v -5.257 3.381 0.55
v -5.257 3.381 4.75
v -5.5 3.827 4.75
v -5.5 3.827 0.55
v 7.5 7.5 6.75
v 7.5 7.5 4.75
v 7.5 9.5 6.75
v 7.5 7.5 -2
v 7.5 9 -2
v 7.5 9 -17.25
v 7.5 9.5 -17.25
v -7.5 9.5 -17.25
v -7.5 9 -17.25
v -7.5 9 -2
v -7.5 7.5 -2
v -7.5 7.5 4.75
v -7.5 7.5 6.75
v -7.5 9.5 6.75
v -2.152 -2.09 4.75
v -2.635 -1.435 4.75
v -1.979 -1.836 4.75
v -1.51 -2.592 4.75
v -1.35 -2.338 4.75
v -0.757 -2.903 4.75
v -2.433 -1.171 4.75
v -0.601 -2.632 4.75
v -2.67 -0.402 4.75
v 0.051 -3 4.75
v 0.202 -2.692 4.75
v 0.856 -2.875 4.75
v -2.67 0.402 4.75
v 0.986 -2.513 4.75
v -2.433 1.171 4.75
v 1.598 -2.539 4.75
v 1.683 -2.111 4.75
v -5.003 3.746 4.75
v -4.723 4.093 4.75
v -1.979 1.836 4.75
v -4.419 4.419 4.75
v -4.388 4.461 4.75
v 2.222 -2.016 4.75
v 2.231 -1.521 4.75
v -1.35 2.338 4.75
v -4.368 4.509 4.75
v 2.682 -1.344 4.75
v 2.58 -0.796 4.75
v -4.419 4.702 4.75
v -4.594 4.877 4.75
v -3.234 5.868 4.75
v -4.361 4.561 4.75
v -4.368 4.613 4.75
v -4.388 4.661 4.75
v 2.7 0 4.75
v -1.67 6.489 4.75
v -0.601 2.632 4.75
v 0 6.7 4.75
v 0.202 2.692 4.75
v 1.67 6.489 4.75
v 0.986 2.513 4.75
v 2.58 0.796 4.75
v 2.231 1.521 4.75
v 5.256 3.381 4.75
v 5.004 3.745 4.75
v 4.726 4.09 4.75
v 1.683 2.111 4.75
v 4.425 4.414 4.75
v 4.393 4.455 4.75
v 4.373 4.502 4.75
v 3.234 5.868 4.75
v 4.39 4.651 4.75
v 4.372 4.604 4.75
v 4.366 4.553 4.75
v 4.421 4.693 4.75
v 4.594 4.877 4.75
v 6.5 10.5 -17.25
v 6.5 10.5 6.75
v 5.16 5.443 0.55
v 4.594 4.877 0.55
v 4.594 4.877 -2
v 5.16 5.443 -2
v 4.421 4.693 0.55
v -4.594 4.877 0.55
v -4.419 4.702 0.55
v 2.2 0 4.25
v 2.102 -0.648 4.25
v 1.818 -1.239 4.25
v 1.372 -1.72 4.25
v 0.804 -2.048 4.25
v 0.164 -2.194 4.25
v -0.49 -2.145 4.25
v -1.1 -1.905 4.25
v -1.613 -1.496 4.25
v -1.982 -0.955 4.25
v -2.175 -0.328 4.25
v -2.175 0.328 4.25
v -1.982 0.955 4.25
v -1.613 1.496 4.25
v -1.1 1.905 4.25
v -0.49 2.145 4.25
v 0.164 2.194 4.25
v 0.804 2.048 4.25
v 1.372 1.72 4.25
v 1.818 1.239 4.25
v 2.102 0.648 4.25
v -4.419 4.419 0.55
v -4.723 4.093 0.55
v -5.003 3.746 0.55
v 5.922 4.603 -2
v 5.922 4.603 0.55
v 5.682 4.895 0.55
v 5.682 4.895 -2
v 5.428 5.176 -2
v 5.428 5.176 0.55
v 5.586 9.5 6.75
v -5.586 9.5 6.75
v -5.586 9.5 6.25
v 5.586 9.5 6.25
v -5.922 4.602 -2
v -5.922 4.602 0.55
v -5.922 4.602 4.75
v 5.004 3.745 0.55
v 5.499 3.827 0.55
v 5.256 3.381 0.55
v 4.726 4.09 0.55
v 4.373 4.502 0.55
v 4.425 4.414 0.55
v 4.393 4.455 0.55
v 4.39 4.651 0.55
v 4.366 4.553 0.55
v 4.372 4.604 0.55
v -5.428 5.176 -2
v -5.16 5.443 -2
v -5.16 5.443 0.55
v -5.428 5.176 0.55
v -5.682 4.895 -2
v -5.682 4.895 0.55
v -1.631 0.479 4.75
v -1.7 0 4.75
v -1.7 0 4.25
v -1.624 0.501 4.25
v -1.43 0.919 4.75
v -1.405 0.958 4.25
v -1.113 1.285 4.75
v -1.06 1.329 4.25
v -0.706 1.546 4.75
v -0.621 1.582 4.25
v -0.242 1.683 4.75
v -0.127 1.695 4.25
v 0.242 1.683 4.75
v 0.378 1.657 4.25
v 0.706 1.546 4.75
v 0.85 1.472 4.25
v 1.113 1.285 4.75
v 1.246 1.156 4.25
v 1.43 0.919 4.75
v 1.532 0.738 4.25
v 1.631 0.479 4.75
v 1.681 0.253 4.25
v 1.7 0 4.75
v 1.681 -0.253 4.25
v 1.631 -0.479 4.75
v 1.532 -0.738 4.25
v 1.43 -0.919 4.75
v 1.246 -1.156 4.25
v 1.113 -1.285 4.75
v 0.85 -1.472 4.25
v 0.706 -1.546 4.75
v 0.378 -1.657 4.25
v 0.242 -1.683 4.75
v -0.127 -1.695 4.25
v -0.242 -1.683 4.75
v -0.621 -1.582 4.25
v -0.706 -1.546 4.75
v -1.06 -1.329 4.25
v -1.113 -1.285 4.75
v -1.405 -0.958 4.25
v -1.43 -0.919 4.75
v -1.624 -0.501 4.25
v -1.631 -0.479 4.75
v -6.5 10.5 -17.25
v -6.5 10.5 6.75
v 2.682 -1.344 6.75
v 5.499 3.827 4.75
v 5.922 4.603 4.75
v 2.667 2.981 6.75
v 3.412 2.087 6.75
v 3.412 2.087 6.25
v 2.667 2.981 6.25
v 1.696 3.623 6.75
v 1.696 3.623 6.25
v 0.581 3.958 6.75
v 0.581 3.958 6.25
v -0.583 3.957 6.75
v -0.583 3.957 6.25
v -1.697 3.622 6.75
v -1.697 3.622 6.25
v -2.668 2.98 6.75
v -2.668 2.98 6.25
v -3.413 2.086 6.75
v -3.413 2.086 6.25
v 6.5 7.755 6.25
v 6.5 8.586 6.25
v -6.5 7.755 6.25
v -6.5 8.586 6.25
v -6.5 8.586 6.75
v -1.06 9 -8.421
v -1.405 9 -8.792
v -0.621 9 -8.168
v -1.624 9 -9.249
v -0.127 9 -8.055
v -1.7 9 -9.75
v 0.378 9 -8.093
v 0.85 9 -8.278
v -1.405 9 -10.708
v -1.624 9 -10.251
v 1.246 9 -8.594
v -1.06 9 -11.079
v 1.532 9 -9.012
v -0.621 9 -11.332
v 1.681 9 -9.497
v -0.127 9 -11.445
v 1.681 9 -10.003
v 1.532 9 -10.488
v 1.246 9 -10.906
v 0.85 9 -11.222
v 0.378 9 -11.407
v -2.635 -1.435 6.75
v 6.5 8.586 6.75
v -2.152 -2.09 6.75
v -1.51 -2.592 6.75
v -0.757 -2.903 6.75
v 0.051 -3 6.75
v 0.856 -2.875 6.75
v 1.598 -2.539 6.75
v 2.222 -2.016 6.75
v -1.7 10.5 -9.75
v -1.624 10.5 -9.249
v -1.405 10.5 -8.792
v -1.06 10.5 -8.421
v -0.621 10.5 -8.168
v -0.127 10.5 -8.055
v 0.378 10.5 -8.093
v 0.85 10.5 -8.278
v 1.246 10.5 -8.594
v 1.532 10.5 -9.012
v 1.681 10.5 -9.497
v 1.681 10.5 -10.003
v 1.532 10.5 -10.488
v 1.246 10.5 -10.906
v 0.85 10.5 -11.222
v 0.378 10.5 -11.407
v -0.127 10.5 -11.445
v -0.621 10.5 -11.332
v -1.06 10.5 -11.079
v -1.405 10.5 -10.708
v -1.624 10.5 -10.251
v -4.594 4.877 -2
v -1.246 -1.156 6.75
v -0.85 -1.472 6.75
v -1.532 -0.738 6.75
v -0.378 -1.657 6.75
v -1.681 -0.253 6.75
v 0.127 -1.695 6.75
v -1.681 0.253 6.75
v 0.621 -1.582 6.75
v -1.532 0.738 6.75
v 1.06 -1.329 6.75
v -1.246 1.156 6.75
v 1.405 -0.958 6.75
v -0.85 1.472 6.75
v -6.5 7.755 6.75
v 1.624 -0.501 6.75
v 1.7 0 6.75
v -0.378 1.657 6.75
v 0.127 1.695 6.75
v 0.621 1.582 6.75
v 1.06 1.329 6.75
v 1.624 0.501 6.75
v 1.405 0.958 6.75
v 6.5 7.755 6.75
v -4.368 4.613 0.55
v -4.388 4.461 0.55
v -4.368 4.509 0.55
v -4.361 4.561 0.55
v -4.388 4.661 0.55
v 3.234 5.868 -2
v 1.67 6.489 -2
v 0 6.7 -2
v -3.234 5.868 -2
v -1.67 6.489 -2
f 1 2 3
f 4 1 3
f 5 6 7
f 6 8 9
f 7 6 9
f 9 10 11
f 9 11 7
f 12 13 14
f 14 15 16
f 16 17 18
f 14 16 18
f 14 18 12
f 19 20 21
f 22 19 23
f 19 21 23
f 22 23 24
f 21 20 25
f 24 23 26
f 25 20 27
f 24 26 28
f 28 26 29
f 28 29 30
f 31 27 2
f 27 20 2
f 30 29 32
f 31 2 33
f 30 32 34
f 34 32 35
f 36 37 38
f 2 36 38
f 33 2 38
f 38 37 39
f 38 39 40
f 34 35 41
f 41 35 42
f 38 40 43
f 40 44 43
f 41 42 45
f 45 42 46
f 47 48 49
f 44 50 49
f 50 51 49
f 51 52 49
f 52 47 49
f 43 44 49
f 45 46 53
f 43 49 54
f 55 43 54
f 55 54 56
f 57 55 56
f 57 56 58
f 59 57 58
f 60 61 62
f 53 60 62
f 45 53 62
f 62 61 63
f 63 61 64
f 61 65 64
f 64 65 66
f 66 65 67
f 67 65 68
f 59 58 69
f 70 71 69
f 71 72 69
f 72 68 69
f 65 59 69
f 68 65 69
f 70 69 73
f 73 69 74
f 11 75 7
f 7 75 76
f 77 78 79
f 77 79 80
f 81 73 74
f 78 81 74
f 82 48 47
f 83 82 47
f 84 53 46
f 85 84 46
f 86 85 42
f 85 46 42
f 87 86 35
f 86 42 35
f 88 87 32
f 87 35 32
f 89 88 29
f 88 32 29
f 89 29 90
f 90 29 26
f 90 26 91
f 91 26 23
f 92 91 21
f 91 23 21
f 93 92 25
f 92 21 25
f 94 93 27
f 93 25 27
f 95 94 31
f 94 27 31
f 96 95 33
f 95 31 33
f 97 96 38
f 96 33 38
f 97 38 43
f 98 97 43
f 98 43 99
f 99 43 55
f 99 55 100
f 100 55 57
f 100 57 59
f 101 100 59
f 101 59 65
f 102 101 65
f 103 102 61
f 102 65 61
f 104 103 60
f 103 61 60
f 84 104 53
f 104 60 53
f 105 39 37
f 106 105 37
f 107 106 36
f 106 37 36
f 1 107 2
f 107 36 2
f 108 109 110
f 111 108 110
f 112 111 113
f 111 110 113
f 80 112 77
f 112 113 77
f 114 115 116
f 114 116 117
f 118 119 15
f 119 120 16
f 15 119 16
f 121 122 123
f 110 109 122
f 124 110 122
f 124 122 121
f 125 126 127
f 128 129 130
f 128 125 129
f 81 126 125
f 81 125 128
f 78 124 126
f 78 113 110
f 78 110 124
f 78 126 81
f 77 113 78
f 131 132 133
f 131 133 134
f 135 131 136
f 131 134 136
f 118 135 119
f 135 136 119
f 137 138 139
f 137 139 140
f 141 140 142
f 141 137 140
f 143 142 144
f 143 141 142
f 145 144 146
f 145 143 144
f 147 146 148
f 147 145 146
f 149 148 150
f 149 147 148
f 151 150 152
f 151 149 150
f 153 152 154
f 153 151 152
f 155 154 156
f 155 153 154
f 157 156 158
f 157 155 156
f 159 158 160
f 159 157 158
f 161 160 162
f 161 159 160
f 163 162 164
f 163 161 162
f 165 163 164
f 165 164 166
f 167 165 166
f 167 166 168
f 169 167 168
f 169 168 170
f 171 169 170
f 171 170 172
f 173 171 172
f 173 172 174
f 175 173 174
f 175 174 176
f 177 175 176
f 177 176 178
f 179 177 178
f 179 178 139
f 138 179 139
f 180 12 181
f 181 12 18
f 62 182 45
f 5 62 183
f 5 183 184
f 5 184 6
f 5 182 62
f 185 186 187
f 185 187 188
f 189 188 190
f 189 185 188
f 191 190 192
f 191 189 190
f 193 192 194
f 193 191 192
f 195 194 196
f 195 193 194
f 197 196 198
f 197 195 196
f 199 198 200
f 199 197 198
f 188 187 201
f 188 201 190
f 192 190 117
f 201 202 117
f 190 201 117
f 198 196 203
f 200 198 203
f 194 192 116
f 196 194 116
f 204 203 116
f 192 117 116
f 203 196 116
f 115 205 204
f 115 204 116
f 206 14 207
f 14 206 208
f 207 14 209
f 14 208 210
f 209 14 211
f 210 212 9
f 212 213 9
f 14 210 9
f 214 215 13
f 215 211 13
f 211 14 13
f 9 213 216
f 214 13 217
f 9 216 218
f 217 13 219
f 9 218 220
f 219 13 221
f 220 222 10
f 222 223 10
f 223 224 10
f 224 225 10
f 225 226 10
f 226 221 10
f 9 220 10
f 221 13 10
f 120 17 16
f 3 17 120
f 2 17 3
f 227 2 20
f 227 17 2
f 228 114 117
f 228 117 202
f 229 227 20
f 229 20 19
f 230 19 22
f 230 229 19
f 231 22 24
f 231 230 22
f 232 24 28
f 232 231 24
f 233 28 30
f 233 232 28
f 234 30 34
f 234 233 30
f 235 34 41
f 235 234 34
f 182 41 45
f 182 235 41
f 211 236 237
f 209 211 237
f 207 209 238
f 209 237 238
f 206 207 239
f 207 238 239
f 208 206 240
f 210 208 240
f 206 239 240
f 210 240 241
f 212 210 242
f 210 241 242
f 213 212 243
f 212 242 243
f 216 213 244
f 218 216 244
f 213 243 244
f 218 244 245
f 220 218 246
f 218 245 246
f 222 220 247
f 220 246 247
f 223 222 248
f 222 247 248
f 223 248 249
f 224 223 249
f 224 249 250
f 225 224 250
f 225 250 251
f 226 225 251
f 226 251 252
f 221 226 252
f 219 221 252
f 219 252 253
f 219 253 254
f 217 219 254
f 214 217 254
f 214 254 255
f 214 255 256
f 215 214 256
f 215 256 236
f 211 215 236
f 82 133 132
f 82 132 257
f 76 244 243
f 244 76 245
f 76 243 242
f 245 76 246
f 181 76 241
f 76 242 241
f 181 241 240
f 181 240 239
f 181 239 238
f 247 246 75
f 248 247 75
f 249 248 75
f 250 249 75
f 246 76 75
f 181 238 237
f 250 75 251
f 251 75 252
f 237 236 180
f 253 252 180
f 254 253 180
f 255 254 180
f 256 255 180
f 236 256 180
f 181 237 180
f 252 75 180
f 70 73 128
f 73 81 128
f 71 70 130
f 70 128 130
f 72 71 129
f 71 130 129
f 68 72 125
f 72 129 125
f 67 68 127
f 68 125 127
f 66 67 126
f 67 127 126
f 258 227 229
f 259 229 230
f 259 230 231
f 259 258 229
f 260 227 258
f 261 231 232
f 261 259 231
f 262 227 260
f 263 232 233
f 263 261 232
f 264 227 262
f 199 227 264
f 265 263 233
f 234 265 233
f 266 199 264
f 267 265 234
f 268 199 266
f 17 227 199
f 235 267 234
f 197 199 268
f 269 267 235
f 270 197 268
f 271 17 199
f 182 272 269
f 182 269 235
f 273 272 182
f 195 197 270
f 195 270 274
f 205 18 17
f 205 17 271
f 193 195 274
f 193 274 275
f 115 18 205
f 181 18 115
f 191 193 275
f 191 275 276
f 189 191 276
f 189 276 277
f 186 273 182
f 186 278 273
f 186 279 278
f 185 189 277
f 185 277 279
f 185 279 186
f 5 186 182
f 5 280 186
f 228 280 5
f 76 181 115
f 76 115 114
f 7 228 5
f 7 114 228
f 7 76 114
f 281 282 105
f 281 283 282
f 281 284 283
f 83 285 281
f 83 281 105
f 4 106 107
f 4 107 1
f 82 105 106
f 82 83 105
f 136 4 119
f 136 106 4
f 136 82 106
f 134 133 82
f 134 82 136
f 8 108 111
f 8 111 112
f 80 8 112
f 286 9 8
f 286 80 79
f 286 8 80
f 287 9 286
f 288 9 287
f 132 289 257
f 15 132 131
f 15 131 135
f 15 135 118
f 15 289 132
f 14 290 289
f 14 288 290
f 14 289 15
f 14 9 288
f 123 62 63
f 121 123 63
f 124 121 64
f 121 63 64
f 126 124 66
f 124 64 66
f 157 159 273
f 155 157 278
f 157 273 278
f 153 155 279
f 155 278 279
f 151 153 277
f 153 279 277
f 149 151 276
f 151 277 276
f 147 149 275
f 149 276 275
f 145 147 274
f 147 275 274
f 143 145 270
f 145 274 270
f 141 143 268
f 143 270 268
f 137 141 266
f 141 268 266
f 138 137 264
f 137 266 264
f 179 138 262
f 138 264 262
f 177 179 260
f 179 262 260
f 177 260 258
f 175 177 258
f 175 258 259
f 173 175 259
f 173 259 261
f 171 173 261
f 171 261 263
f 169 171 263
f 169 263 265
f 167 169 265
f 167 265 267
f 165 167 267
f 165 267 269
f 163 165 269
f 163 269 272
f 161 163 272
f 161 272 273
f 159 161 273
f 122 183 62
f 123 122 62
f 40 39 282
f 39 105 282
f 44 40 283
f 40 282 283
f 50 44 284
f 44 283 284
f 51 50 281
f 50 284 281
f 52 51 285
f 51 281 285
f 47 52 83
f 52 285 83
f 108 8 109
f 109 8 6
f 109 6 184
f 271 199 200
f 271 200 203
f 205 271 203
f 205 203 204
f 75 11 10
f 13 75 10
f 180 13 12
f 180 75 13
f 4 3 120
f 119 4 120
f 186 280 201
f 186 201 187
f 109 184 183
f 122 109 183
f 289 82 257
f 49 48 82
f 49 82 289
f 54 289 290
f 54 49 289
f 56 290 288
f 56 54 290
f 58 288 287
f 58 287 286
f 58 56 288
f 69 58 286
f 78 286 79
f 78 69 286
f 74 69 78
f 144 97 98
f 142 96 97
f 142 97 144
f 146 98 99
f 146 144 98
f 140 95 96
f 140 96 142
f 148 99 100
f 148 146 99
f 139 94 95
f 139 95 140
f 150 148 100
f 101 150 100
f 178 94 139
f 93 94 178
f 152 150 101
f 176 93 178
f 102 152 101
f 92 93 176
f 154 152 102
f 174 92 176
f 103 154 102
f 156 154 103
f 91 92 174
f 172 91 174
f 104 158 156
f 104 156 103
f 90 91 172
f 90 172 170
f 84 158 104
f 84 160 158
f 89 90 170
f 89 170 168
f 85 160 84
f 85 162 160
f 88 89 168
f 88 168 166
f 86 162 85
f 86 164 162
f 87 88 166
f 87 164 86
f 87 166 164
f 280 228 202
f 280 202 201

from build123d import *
from build123d.topology import SkipClean

# Parameters (mm, degrees)
BOSS_EXTRUDE1_DEPTH  = 2
BOSS_EXTRUDE2_START  = 4.75
BOSS_EXTRUDE2_DEPTH  = 4.75
BOSS_EXTRUDE3_START  = 2
SKETCH3_R            = 3
SKETCH3_R_2          = 1.7
BOSS_EXTRUDE3_DEPTH  = 2
SKETCH4_R            = 2.2
SKETCH4_R_2          = 1.7
BOSS_EXTRUDE4_DEPTH  = 0.5
CHAMFER1_SIZE        = 0.5
SKETCH5_W            = 7.5
SKETCH5_H            = 3
BOSS_EXTRUDE5_DEPTH  = 2
BOSS_EXTRUDE6_DEPTH  = 4.2
BOSS_EXTRUDE8_DEPTH  = 6.75
SKETCH10_W           = 15
SKETCH10_H           = 3
BOSS_EXTRUDE9_DEPTH  = 15.25
SKETCH11_R           = 1.65
CUT_EXTRUDE1_DEPTH   = 22.542109925
FILLET1_R            = 0.2
CHAMFER6_SIZE        = 1.5
BOSS_EXTRUDE12_REACH = 29.249
SKETCH16_W           = 15
SKETCH16_H           = 1.5
CUT_EXTRUDE3_DEPTH   = 0.5
CHAMFER7_SIZE        = 1
CUT_EXTRUDE4_DEPTH   = 15.25
SKETCH18_R           = 1.7
CUT_EXTRUDE5_DEPTH   = 10


with BuildPart() as part:
    # Sketch1 → Boss-Extrude1 (new body)
    with BuildSketch(Plane.XY):
        with BuildLine():
            Line((4.594082841, 4.876925553), (5.159993549, 5.442836262))
            ThreePointArc((5.159993549, 5.442836262), (0, 7.5), (-5.159993549, 5.442836262))
            Line((-5.159993549, 5.442836262), (-4.594082841, 4.876925553))
            ThreePointArc((-4.594082841, 4.876925553), (0, 6.7), (4.594082841, 4.876925553))
        make_face()
    extrude(amount=-BOSS_EXTRUDE1_DEPTH)

    # Sketch1<3> → Boss-Extrude2 (add)
    with BuildSketch(Plane.XY.offset(BOSS_EXTRUDE2_START)):
        with BuildLine():
            Line((4.594082841, 4.876925553), (5.159993549, 5.442836262))
            ThreePointArc((5.159993549, 5.442836262), (0, 7.5), (-5.159993549, 5.442836262))
            Line((-5.159993549, 5.442836262), (-4.594082841, 4.876925553))
            ThreePointArc((-4.594082841, 4.876925553), (0, 6.7), (4.594082841, 4.876925553))
        make_face()
    extrude(amount=-BOSS_EXTRUDE2_DEPTH)

    # Sketch3 → Boss-Extrude3 (add)
    # profile 1 of 4: a face of its own
    with BuildSketch(Plane.XY.offset(4.75).offset(BOSS_EXTRUDE3_START)):
        with BuildLine():
            Line((-4.594082841, 4.876925553), (-5.159993549, 5.442836262))
            Line((-5.159993549, 5.442836262), (-2.820975701, -1.02083108))
            ThreePointArc((-2.820975701, -1.02083108), (-2.892694114, 0.795185994), (-1.902774006, 2.31936437))
            Line((-1.902774006, 2.31936437), (-2.780654635, 4.745309242))
            ThreePointArc((-2.780654635, 4.745309242), (0, 5.5), (2.780654635, 4.745309242))
            Line((2.780654635, 4.745309242), (1.902774006, 2.31936437))
            ThreePointArc((1.902774006, 2.31936437), (2.711855639, 1.282902565), (3, 0))
            ThreePointArc((3, 0), (2.954904999, -0.518205025), (2.820975701, -1.02083108))
            Line((2.820975701, -1.02083108), (5.159993549, 5.442836262))
            Line((5.159993549, 5.442836262), (4.594082841, 4.876925553))
            ThreePointArc((4.594082841, 4.876925553), (0, 6.7), (-4.594082841, 4.876925553))
        make_face()
    # profile 2 of 4: a face of its own
    with BuildSketch(Plane.XY.offset(4.75).offset(BOSS_EXTRUDE3_START)):
        with BuildLine():
            Line((-5.159993549, 5.442836262), (-4.594082841, 4.876925553))
            ThreePointArc((-4.594082841, 4.876925553), (0, 6.7), (4.594082841, 4.876925553))
            Line((4.594082841, 4.876925553), (5.159993549, 5.442836262))
            ThreePointArc((5.159993549, 5.442836262), (0, 7.5), (-5.159993549, 5.442836262))
        make_face()
    # profile 3 of 4: a face of its own
    with BuildSketch(Plane.XY.offset(4.75).offset(BOSS_EXTRUDE3_START)):
        Circle(SKETCH3_R)
        Circle(SKETCH3_R_2, mode=Mode.SUBTRACT)
    # profile 4 of 4: a face of its own
    with BuildSketch(Plane.XY.offset(4.75).offset(BOSS_EXTRUDE3_START)):
        with BuildLine():
            Line((-2.780654635, 4.745309242), (-1.902774006, 2.31936437))
            ThreePointArc((-1.902774006, 2.31936437), (0, 3), (1.902774006, 2.31936437))
            Line((1.902774006, 2.31936437), (2.780654635, 4.745309242))
            ThreePointArc((2.780654635, 4.745309242), (0, 5.5), (-2.780654635, 4.745309242))
        make_face()
    extrude(amount=-BOSS_EXTRUDE3_DEPTH)

    # Sketch4 → Boss-Extrude4 (add)
    with SkipClean():  # the faces are left unmerged after this step: merging them gives an invalid solid
        with BuildSketch(Plane(origin=(0, 0, 4.75), x_dir=(-1, 0, 0), z_dir=(0, 0, -1))):
            with Locations(Location((0, 0, 0), (0, 0, 180))):
                Circle(SKETCH4_R)
            Circle(SKETCH4_R_2, mode=Mode.SUBTRACT)
        extrude(amount=BOSS_EXTRUDE4_DEPTH)
    add(part.part.scale(1), mode=Mode.REPLACE)  # the faces are merged on a copy

    # Chamfer1
    chamfer1_edges = [part.edges().sort_by_distance(p)[0] for p in [
        (-2.2, 0, 4.75),
    ]]
    chamfer(chamfer1_edges, length=CHAMFER1_SIZE - 0.0001)  # a hair under: the kernel refuses the full size

    # Sketch5 → Boss-Extrude5 (add)
    with BuildSketch(Plane.XY.offset(6.75)):
        with BuildLine():
            ThreePointArc((-5.159993549, 5.442836262), (-2.777474396, 6.966752183), (0, 7.5))
            Line((0, 7.5), (-7.5, 7.5))
            Line((-7.5, 7.5), (-2.634698995, -1.434698995))
            ThreePointArc((-2.634698995, -1.434698995), (-2.735675101, -1.231292711), (-2.820975701, -1.02083108))
            Line((-2.820975701, -1.02083108), (-5.159993549, 5.442836262))
        make_face()
        with Locations((-3.75, 9)):
            Rectangle(SKETCH5_W, SKETCH5_H)
        with Locations((3.75, 9)):
            Rectangle(SKETCH5_W, SKETCH5_H)
        with BuildLine():
            Line((7.5, 7.5), (0, 7.5))
            ThreePointArc((0, 7.5), (2.777474396, 6.966752183), (5.159993549, 5.442836262))
            Line((5.159993549, 5.442836262), (2.820975701, -1.02083108))
            ThreePointArc((2.820975701, -1.02083108), (2.756369418, -1.184241374), (2.682306676, -1.343588812))
            Line((2.682306676, -1.343588812), (7.5, 7.5))
        make_face()
    extrude(amount=-BOSS_EXTRUDE5_DEPTH)

    # Sketch6 → Boss-Extrude6 (add)
    with SkipClean():  # the faces are left unmerged after this step: merging them gives an invalid solid
        with BuildSketch(Plane(origin=(0, 0, 4.75), x_dir=(-1, 0, 0), z_dir=(0, 0, -1))):
            with BuildLine():
                Line((-5.921621025, 4.602651891), (-5.499242594, 3.827313795))
                ThreePointArc((-5.499242594, 3.827313795), (-5.073876801, 4.375588441), (-4.594082841, 4.876925553))
                Line((-4.594082841, 4.876925553), (-5.159993549, 5.442836262))
                ThreePointArc((-5.159993549, 5.442836262), (-5.556709713, 5.037159632), (-5.921621025, 4.602651891))
            make_face()
            with BuildLine():
                Line((5.159993549, 5.442836262), (4.594082841, 4.876925553))
                ThreePointArc((4.594082841, 4.876925553), (5.074143899, 4.375278699), (5.499709828, 3.826642367))
                Line((5.499709828, 3.826642367), (5.922007367, 4.602154794))
                ThreePointArc((5.922007367, 4.602154794), (5.556921127, 5.036926403), (5.159993549, 5.442836262))
            make_face()
            with BuildLine():
                Line((-5.499242594, 3.827313795), (-5.256310338, 3.381375701))
                ThreePointArc((-5.256310338, 3.381375701), (-4.806527723, 3.994970744), (-4.285525038, 4.549370852))
                Line((-4.285525038, 4.549370852), (-4.594082841, 4.876925553))
                ThreePointArc((-4.594082841, 4.876925553), (-5.073876801, 4.375588441), (-5.499242594, 3.827313795))
            make_face()
            with BuildLine():
                Line((4.594082841, 4.876925553), (4.275732705, 4.558575417))
                ThreePointArc((4.275732705, 4.558575417), (4.802528974, 3.999776925), (5.256816116, 3.380589346))
                Line((5.256816116, 3.380589346), (5.499709828, 3.826642367))
                ThreePointArc((5.499709828, 3.826642367), (5.074143899, 4.375278699), (4.594082841, 4.876925553))
            make_face()
        extrude(amount=BOSS_EXTRUDE6_DEPTH)

    # Sketch8 → Boss-Extrude8 (add)
    with BuildSketch(Plane(origin=(0, 0, 4.75), x_dir=(-1, 0, 0), z_dir=(0, 0, -1))):
        with BuildLine():
            Line((5.922007367, 4.602154794), (7.5, 7.5))
            Line((7.5, 7.5), (7.5, 10.5))
            Line((7.5, 10.5), (-7.5, 10.5))
            Line((-7.5, 10.5), (-7.5, 7.5))
            Line((-7.5, 7.5), (-5.921621025, 4.602651891))
            ThreePointArc((-5.921621025, 4.602651891), (0.000314788, 7.499999993), (5.922007367, 4.602154794))
        make_face()
    extrude(amount=BOSS_EXTRUDE8_DEPTH)

    # Sketch10 → Boss-Extrude9 (add)
    with BuildSketch(Plane(origin=(0, 0, -2), x_dir=(-1, 0, 0), z_dir=(0, 0, -1))):
        with Locations((0, 9)):
            Rectangle(SKETCH10_W, SKETCH10_H)
    extrude(amount=BOSS_EXTRUDE9_DEPTH)

    # Sketch11 → Cut-Extrude1 (cut, through all)
    with BuildSketch(Plane.XZ.offset(-7.5)):
        with Locations(Location((0, -9.5, 0), (0, 0, 270))):
            Circle(SKETCH11_R)
    extrude(amount=-CUT_EXTRUDE1_DEPTH, mode=Mode.SUBTRACT)

    # Fillet1
    fillet1_edges = [part.edges().sort_by_distance(p)[0] for p in [
        (4.285525038, 4.549370852, 2.65),
        (-4.275732705, 4.558575417, 2.65),
    ]]
    fillet(fillet1_edges, radius=FILLET1_R)

    # Chamfer6
    chamfer6_edges = [part.edges().sort_by_distance(p)[0] for p in [
        (7.5, 10.5, -5.25),
        (-7.5, 10.5, -5.25),
    ]]
    chamfer(chamfer6_edges, length=CHAMFER6_SIZE)

    # Boss-Extrude12: up to this face of the body (flat: up to its plane)
    boss_extrude12_end = Plane(part.part.faces().sort_by_distance((-0.00029363, 5.45528482, 6.75))[0])
    # Sketch16 → Boss-Extrude12 (add, up to the picked face)
    with BuildSketch(Plane(origin=(0, 0, -17.25), x_dir=(-1, 0, 0), z_dir=(0, 0, -1)), mode=Mode.PRIVATE) as boss_extrude12_sk1:
        with Locations((0, 9.75)):
            Rectangle(SKETCH16_W, SKETCH16_H)
    boss_extrude12_tool1 = split(extrude(boss_extrude12_sk1.sketch, amount=-BOSS_EXTRUDE12_REACH, mode=Mode.PRIVATE), bisect_by=boss_extrude12_end, keep=Keep.BOTH, mode=Mode.PRIVATE)
    add(boss_extrude12_tool1.solids().sort_by(Axis((0, 9.75, -17.25), (0, 0, 1)))[0])

    # Sketch13 → Cut-Extrude3 (cut)
    with BuildSketch(Plane.XY.offset(6.75)):
        with BuildLine():
            ThreePointArc((3.4124071, 2.086978147), (-0.000677338, 3.999999943), (-3.413113698, 2.085822351))
            Line((-3.413113698, 2.085822351), (-6.5, 7.754618569))
            Line((-6.5, 7.754618569), (-6.5, 8.585786438))
            Line((-6.5, 8.585786438), (-5.585786438, 9.5))
            Line((-5.585786438, 9.5), (5.585786438, 9.5))
            Line((5.585786438, 9.5), (6.5, 8.585786438))
            Line((6.5, 8.585786438), (6.5, 7.754711685))
            Line((6.5, 7.754711685), (3.4124071, 2.086978147))
        make_face()
    extrude(amount=-CUT_EXTRUDE3_DEPTH, mode=Mode.SUBTRACT)

    # Chamfer7
    chamfer7_edges = [part.edges().sort_by_distance(p)[0] for p in [
        (7.5, 10.5, -5.25),
        (-7.5, 10.5, -5.25),
    ]]
    chamfer(chamfer7_edges, length=CHAMFER7_SIZE)

    # Sketch17 → Cut-Extrude4 (cut)
    with BuildSketch(Plane(origin=(0, 0, -17.25), x_dir=(-1, 0, 0), z_dir=(0, 0, -1))):
        Polygon((7.5, 9), (-6.884093455, 9), (-7.5, 9), (-7.5, 7.5), (7.5, 7.5), align=None)
    extrude(amount=-CUT_EXTRUDE4_DEPTH, mode=Mode.SUBTRACT)

    # Sketch18 → Cut-Extrude5 (cut)
    with BuildSketch(Plane(origin=(0, 10.5, 0), x_dir=(1, 0, 0), z_dir=(0, 1, 0))):
        with Locations(Location((0, 9.75, 0), (0, 0, 180))):
            Circle(SKETCH18_R)
    extrude(amount=-CUT_EXTRUDE5_DEPTH, mode=Mode.SUBTRACT)


solid = part.part
